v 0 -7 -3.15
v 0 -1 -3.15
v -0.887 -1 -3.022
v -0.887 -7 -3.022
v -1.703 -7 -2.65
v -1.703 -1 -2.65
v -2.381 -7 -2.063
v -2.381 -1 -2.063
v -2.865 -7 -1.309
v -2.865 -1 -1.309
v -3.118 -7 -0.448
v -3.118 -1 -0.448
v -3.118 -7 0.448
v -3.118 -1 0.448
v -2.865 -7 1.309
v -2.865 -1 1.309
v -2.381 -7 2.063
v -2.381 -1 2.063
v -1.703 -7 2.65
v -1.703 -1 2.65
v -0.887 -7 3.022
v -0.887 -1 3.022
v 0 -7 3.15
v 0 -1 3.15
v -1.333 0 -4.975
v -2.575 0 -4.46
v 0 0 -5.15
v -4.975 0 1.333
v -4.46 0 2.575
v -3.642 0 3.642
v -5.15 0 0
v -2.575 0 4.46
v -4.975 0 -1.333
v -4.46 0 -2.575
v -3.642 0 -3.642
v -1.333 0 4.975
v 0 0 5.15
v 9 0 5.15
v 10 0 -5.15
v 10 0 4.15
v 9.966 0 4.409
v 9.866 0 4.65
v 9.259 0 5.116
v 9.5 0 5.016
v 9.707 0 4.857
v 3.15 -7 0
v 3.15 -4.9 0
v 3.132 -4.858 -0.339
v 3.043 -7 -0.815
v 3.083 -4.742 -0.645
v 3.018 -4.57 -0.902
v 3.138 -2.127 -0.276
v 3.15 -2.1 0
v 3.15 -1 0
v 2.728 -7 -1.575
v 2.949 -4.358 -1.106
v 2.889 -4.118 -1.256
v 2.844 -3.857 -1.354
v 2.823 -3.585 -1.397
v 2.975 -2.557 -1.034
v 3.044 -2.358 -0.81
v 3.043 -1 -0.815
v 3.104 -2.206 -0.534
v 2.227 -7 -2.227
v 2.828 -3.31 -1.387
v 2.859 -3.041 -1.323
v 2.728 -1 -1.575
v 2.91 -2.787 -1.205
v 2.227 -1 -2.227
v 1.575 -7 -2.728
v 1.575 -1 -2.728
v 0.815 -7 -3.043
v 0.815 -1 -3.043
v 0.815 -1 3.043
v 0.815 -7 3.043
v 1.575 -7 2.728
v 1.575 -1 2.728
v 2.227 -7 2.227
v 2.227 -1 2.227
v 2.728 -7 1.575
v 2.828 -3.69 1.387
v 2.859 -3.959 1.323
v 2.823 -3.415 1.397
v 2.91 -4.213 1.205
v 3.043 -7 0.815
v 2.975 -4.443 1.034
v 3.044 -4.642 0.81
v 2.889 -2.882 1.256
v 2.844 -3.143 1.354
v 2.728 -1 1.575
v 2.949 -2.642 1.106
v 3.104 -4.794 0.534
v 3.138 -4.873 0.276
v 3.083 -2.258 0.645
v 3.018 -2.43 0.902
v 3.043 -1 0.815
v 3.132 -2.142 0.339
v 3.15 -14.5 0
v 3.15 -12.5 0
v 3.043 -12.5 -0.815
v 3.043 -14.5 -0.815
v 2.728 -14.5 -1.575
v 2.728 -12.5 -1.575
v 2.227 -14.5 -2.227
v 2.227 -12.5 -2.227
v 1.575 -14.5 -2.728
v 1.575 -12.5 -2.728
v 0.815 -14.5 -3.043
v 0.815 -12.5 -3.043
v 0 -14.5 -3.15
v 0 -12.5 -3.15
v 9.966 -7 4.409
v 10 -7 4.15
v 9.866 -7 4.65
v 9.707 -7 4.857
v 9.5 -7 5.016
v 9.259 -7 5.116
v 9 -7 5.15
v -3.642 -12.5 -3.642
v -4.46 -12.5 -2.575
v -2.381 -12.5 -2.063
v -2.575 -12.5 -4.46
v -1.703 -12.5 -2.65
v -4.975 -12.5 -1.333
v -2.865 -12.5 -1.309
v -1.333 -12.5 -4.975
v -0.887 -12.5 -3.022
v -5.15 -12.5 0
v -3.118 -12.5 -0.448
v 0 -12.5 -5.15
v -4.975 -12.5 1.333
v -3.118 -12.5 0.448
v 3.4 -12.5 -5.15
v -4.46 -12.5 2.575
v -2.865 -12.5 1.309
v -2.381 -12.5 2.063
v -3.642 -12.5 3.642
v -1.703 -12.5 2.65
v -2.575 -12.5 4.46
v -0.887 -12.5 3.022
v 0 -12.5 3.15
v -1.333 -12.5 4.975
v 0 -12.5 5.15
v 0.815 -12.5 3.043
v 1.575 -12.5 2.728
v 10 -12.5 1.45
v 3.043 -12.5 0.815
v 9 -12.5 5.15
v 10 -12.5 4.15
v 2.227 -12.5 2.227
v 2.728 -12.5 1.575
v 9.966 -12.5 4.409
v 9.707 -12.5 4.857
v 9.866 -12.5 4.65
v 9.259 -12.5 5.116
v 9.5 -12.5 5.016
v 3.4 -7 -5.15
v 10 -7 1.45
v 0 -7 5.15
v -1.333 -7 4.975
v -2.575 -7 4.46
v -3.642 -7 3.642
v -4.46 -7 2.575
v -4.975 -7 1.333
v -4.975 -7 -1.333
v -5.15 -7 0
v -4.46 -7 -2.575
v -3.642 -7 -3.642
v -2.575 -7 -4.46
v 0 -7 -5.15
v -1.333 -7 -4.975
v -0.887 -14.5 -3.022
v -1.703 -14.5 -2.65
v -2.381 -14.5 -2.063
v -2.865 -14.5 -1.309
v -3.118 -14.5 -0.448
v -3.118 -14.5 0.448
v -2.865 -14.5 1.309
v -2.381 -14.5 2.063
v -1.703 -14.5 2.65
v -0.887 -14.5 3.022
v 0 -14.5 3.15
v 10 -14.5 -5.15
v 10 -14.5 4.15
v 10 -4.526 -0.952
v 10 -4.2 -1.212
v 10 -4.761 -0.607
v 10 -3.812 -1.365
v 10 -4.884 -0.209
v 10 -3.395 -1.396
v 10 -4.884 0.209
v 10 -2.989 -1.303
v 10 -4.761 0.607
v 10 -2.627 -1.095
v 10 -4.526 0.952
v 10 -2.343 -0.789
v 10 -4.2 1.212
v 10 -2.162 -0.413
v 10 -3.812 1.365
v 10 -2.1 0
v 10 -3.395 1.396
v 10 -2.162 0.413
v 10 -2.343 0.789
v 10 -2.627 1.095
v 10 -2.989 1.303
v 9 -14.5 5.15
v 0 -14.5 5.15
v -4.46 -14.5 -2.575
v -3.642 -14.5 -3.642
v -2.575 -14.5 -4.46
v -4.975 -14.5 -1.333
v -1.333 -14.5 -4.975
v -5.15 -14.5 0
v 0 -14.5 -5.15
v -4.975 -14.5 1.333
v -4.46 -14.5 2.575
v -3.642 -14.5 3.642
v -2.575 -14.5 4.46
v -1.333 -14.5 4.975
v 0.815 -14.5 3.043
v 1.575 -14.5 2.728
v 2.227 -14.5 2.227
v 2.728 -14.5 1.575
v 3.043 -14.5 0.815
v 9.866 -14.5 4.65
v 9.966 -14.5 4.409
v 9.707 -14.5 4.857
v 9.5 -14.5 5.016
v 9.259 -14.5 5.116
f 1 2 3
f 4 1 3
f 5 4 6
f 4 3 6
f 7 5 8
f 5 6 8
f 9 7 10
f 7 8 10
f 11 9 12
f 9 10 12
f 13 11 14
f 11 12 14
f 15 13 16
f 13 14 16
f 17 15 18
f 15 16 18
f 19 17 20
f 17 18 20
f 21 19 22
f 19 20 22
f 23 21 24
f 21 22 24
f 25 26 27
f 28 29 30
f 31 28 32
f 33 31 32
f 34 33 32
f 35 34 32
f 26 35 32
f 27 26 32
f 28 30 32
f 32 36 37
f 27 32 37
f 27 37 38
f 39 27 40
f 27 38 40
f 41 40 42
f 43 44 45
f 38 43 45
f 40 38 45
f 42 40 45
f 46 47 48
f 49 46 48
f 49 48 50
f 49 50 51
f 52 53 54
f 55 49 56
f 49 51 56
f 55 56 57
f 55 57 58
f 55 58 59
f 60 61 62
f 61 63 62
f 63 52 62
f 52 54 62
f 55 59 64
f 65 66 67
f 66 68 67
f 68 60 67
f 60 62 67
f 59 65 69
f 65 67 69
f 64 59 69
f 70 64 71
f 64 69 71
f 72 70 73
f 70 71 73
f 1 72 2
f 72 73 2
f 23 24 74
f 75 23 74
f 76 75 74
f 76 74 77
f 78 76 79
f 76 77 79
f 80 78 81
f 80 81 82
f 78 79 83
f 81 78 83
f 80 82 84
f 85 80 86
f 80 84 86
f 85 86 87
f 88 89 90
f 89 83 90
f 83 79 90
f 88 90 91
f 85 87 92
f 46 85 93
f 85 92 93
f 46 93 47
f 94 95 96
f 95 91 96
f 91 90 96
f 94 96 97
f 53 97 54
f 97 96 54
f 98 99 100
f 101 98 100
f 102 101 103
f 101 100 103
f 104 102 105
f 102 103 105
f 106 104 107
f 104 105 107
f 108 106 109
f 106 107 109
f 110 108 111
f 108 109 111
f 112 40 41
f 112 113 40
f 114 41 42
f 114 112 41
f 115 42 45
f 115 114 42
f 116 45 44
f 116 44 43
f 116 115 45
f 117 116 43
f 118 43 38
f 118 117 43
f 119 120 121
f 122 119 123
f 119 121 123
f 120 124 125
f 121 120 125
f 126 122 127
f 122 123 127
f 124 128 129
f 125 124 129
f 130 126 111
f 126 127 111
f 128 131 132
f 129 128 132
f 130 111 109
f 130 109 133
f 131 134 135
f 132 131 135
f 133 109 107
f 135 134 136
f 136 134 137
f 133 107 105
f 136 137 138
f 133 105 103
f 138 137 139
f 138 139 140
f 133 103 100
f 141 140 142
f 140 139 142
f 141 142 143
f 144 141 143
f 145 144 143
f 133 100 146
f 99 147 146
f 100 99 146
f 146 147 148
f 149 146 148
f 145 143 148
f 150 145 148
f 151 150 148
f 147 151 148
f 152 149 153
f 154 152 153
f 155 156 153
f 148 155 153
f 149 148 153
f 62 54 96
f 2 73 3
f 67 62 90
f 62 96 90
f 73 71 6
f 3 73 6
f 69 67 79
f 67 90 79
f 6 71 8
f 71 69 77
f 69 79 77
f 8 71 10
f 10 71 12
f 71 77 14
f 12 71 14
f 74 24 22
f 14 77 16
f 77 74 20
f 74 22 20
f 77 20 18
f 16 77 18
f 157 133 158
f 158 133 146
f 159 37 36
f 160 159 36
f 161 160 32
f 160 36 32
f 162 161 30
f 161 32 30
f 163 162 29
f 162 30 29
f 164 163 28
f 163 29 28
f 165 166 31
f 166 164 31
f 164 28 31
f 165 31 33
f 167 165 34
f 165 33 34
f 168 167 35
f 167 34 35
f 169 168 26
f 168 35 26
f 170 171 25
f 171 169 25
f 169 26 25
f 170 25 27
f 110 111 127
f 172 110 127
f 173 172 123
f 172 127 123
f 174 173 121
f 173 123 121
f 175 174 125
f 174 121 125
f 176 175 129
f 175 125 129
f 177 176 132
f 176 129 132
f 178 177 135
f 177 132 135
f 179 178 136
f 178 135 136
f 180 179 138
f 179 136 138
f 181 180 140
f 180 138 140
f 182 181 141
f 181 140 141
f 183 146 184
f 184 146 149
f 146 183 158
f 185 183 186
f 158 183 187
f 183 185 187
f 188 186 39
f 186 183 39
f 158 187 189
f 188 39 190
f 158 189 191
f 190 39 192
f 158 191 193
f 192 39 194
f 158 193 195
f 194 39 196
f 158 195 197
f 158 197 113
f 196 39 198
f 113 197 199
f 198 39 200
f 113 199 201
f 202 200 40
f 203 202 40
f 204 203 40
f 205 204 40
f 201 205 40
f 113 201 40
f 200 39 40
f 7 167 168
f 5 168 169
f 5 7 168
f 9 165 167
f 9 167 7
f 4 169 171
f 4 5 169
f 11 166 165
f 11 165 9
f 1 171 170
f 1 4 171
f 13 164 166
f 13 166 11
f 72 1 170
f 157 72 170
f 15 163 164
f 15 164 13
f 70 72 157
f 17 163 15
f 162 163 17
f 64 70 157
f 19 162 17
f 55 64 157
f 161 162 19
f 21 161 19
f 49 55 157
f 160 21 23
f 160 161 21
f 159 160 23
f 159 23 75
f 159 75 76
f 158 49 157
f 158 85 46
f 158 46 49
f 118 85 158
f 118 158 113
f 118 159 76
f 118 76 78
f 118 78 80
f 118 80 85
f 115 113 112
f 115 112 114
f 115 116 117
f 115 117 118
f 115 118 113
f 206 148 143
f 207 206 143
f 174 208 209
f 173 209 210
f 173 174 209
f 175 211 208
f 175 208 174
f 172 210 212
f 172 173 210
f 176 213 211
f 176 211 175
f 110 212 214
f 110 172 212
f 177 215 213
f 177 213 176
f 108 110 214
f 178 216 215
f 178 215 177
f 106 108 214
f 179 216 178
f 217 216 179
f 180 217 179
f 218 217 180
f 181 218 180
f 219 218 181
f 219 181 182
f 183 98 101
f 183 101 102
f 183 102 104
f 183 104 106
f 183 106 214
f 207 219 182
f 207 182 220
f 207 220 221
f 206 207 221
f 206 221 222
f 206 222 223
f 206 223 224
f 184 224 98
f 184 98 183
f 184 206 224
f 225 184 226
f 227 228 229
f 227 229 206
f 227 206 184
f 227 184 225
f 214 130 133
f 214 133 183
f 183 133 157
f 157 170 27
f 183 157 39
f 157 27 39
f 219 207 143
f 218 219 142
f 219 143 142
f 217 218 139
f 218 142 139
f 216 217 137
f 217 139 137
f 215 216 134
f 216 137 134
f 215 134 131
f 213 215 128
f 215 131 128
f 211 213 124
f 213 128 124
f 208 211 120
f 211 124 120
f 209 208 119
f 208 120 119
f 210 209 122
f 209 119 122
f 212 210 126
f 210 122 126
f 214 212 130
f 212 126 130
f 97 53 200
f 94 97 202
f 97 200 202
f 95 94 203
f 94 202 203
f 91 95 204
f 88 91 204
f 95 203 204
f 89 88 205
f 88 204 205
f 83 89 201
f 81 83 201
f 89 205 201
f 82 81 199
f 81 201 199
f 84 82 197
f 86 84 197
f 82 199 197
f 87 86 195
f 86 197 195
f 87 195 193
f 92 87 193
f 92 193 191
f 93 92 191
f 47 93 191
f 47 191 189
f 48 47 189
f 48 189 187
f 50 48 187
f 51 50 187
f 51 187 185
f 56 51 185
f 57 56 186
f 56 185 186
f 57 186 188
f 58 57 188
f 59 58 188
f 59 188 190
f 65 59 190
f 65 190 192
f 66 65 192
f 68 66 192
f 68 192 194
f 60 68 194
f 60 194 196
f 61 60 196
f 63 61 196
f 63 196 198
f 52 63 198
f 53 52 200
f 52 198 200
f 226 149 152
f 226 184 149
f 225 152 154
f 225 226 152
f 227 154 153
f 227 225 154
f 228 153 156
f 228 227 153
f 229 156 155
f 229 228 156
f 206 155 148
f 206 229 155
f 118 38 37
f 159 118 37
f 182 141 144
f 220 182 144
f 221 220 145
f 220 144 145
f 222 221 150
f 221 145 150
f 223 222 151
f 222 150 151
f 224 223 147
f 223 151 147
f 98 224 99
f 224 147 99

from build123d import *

# Parameters (mm, degrees)
F1_DEPTH = 14.5
F4_DEPTH = 5.5
F5_R     = 1.4
F6_DEPTH = 9.5
F7_R     = 4
F8_DEPTH = 1
F9_R     = 1


with BuildPart() as f1:
    # F0 (on Front) → F1 (new body)
    with BuildSketch(Plane.XZ):
        with BuildLine():
            ThreePointArc((0, 3.15), (2.2273863607, 2.2273863607), (3.15, 0))
            ThreePointArc((3.15, 0), (2.2273863607, -2.2273863607), (0, -3.15))
            Line((0, -3.15), (0, -5.15))
            Line((0, -5.15), (10, -5.15))
            Line((10, -5.15), (10, 0))
            Line((10, 0), (10, 5.15))
            Line((10, 5.15), (0, 5.15))
            Line((0, 5.15), (0, 3.15))
        make_face()
        with BuildLine():
            ThreePointArc((0, -3.15), (-3.15, 0), (0, 3.15))
            Line((0, 3.15), (0, 5.15))
            ThreePointArc((0, 5.15), (-5.15, 0), (0, -5.15))
            Line((0, -5.15), (0, -3.15))
        make_face()
    extrude(amount=F1_DEPTH)

    # F3 (on offset) → F4 (cut)
    with BuildSketch(Plane.XZ.offset(12.5)):
        Polygon((-9.8062800243, -5.15), (0, -5.15), (3.4, -5.15), (10, 1.45), (10, 5.7288180105), (-9.8062800243, 5.7288180105), align=None)
    extrude(amount=-F4_DEPTH, mode=Mode.SUBTRACT)

    # F5 (on face) → F6 (cut)
    with BuildSketch(Plane.YZ.offset(10)):
        with Locations((-3.5, 0)):
            Circle(F5_R)
    extrude(amount=-F6_DEPTH, mode=Mode.SUBTRACT)

    # F7 (on face) → F8 (join)
    with BuildSketch(Plane(origin=(0, 0, 0), x_dir=(-1, 0, 0), z_dir=(0, 1, 0))):
        Circle(F7_R)
    extrude(amount=-F8_DEPTH)

    # F9
    f9_edges = [f1.edges().sort_by_distance(p)[0] for p in [
        (10, -13.5, 5.15),
        (10, -3.5, 5.15),
    ]]
    fillet(f9_edges, radius=F9_R)


solid = f1.part
